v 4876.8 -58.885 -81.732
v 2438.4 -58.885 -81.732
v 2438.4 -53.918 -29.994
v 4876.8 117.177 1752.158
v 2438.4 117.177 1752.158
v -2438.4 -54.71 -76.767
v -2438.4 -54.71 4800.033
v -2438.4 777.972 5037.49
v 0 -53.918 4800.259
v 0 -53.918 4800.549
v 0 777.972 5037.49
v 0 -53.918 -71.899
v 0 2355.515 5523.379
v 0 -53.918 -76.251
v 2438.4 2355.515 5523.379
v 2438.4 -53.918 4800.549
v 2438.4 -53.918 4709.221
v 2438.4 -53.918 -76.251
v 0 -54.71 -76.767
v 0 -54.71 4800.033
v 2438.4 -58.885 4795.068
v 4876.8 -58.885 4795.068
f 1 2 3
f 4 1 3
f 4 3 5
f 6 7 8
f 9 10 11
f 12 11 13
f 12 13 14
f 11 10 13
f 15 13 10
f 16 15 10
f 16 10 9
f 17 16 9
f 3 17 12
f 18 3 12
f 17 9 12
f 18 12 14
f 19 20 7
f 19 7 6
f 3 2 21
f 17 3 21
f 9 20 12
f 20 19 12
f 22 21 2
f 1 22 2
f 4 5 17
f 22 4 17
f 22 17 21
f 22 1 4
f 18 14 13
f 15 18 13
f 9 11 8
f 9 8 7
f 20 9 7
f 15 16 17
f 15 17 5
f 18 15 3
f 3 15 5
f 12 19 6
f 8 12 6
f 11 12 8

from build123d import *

# Parameters (mm, degrees)
F1_DEPTH = 2438.4
F3_DEPTH = 2438.4
F5_START = 2438.4
F5_DEPTH = 2438.4


with BuildPart() as f1:
    # F0 (on Right) → F1 (new body)
    with BuildSketch(Plane.YZ):
        Polygon((2355.5145265505, 5523.3785235716), (-53.9176911116, 4800.548858273), (2044.4923362358, 4800.548858273), align=None)
        Polygon((-53.9176911116, 4800.548858273), (-53.9176911116, -76.251141727), (2044.4923362358, 4800.548858273), align=None)
    extrude(amount=F1_DEPTH)

    # F2 (on Right) → F3 (join)
    with BuildSketch(Plane.YZ):
        Polygon((-54.7102242708, 4800.0330992818), (-54.7102242708, -76.7669007182), (777.9717968815, 5037.4895664185), align=None)
    extrude(amount=-F3_DEPTH)

    # F4 (on Right) → F5 (join)
    with BuildSketch(Plane.YZ.offset(F5_START)):
        Polygon((-58.8847696781, 4795.068404901), (-58.8847696781, -81.731595099), (117.1771129639, 1752.157592294), align=None)
    extrude(amount=F5_DEPTH)


solid = f1.part
